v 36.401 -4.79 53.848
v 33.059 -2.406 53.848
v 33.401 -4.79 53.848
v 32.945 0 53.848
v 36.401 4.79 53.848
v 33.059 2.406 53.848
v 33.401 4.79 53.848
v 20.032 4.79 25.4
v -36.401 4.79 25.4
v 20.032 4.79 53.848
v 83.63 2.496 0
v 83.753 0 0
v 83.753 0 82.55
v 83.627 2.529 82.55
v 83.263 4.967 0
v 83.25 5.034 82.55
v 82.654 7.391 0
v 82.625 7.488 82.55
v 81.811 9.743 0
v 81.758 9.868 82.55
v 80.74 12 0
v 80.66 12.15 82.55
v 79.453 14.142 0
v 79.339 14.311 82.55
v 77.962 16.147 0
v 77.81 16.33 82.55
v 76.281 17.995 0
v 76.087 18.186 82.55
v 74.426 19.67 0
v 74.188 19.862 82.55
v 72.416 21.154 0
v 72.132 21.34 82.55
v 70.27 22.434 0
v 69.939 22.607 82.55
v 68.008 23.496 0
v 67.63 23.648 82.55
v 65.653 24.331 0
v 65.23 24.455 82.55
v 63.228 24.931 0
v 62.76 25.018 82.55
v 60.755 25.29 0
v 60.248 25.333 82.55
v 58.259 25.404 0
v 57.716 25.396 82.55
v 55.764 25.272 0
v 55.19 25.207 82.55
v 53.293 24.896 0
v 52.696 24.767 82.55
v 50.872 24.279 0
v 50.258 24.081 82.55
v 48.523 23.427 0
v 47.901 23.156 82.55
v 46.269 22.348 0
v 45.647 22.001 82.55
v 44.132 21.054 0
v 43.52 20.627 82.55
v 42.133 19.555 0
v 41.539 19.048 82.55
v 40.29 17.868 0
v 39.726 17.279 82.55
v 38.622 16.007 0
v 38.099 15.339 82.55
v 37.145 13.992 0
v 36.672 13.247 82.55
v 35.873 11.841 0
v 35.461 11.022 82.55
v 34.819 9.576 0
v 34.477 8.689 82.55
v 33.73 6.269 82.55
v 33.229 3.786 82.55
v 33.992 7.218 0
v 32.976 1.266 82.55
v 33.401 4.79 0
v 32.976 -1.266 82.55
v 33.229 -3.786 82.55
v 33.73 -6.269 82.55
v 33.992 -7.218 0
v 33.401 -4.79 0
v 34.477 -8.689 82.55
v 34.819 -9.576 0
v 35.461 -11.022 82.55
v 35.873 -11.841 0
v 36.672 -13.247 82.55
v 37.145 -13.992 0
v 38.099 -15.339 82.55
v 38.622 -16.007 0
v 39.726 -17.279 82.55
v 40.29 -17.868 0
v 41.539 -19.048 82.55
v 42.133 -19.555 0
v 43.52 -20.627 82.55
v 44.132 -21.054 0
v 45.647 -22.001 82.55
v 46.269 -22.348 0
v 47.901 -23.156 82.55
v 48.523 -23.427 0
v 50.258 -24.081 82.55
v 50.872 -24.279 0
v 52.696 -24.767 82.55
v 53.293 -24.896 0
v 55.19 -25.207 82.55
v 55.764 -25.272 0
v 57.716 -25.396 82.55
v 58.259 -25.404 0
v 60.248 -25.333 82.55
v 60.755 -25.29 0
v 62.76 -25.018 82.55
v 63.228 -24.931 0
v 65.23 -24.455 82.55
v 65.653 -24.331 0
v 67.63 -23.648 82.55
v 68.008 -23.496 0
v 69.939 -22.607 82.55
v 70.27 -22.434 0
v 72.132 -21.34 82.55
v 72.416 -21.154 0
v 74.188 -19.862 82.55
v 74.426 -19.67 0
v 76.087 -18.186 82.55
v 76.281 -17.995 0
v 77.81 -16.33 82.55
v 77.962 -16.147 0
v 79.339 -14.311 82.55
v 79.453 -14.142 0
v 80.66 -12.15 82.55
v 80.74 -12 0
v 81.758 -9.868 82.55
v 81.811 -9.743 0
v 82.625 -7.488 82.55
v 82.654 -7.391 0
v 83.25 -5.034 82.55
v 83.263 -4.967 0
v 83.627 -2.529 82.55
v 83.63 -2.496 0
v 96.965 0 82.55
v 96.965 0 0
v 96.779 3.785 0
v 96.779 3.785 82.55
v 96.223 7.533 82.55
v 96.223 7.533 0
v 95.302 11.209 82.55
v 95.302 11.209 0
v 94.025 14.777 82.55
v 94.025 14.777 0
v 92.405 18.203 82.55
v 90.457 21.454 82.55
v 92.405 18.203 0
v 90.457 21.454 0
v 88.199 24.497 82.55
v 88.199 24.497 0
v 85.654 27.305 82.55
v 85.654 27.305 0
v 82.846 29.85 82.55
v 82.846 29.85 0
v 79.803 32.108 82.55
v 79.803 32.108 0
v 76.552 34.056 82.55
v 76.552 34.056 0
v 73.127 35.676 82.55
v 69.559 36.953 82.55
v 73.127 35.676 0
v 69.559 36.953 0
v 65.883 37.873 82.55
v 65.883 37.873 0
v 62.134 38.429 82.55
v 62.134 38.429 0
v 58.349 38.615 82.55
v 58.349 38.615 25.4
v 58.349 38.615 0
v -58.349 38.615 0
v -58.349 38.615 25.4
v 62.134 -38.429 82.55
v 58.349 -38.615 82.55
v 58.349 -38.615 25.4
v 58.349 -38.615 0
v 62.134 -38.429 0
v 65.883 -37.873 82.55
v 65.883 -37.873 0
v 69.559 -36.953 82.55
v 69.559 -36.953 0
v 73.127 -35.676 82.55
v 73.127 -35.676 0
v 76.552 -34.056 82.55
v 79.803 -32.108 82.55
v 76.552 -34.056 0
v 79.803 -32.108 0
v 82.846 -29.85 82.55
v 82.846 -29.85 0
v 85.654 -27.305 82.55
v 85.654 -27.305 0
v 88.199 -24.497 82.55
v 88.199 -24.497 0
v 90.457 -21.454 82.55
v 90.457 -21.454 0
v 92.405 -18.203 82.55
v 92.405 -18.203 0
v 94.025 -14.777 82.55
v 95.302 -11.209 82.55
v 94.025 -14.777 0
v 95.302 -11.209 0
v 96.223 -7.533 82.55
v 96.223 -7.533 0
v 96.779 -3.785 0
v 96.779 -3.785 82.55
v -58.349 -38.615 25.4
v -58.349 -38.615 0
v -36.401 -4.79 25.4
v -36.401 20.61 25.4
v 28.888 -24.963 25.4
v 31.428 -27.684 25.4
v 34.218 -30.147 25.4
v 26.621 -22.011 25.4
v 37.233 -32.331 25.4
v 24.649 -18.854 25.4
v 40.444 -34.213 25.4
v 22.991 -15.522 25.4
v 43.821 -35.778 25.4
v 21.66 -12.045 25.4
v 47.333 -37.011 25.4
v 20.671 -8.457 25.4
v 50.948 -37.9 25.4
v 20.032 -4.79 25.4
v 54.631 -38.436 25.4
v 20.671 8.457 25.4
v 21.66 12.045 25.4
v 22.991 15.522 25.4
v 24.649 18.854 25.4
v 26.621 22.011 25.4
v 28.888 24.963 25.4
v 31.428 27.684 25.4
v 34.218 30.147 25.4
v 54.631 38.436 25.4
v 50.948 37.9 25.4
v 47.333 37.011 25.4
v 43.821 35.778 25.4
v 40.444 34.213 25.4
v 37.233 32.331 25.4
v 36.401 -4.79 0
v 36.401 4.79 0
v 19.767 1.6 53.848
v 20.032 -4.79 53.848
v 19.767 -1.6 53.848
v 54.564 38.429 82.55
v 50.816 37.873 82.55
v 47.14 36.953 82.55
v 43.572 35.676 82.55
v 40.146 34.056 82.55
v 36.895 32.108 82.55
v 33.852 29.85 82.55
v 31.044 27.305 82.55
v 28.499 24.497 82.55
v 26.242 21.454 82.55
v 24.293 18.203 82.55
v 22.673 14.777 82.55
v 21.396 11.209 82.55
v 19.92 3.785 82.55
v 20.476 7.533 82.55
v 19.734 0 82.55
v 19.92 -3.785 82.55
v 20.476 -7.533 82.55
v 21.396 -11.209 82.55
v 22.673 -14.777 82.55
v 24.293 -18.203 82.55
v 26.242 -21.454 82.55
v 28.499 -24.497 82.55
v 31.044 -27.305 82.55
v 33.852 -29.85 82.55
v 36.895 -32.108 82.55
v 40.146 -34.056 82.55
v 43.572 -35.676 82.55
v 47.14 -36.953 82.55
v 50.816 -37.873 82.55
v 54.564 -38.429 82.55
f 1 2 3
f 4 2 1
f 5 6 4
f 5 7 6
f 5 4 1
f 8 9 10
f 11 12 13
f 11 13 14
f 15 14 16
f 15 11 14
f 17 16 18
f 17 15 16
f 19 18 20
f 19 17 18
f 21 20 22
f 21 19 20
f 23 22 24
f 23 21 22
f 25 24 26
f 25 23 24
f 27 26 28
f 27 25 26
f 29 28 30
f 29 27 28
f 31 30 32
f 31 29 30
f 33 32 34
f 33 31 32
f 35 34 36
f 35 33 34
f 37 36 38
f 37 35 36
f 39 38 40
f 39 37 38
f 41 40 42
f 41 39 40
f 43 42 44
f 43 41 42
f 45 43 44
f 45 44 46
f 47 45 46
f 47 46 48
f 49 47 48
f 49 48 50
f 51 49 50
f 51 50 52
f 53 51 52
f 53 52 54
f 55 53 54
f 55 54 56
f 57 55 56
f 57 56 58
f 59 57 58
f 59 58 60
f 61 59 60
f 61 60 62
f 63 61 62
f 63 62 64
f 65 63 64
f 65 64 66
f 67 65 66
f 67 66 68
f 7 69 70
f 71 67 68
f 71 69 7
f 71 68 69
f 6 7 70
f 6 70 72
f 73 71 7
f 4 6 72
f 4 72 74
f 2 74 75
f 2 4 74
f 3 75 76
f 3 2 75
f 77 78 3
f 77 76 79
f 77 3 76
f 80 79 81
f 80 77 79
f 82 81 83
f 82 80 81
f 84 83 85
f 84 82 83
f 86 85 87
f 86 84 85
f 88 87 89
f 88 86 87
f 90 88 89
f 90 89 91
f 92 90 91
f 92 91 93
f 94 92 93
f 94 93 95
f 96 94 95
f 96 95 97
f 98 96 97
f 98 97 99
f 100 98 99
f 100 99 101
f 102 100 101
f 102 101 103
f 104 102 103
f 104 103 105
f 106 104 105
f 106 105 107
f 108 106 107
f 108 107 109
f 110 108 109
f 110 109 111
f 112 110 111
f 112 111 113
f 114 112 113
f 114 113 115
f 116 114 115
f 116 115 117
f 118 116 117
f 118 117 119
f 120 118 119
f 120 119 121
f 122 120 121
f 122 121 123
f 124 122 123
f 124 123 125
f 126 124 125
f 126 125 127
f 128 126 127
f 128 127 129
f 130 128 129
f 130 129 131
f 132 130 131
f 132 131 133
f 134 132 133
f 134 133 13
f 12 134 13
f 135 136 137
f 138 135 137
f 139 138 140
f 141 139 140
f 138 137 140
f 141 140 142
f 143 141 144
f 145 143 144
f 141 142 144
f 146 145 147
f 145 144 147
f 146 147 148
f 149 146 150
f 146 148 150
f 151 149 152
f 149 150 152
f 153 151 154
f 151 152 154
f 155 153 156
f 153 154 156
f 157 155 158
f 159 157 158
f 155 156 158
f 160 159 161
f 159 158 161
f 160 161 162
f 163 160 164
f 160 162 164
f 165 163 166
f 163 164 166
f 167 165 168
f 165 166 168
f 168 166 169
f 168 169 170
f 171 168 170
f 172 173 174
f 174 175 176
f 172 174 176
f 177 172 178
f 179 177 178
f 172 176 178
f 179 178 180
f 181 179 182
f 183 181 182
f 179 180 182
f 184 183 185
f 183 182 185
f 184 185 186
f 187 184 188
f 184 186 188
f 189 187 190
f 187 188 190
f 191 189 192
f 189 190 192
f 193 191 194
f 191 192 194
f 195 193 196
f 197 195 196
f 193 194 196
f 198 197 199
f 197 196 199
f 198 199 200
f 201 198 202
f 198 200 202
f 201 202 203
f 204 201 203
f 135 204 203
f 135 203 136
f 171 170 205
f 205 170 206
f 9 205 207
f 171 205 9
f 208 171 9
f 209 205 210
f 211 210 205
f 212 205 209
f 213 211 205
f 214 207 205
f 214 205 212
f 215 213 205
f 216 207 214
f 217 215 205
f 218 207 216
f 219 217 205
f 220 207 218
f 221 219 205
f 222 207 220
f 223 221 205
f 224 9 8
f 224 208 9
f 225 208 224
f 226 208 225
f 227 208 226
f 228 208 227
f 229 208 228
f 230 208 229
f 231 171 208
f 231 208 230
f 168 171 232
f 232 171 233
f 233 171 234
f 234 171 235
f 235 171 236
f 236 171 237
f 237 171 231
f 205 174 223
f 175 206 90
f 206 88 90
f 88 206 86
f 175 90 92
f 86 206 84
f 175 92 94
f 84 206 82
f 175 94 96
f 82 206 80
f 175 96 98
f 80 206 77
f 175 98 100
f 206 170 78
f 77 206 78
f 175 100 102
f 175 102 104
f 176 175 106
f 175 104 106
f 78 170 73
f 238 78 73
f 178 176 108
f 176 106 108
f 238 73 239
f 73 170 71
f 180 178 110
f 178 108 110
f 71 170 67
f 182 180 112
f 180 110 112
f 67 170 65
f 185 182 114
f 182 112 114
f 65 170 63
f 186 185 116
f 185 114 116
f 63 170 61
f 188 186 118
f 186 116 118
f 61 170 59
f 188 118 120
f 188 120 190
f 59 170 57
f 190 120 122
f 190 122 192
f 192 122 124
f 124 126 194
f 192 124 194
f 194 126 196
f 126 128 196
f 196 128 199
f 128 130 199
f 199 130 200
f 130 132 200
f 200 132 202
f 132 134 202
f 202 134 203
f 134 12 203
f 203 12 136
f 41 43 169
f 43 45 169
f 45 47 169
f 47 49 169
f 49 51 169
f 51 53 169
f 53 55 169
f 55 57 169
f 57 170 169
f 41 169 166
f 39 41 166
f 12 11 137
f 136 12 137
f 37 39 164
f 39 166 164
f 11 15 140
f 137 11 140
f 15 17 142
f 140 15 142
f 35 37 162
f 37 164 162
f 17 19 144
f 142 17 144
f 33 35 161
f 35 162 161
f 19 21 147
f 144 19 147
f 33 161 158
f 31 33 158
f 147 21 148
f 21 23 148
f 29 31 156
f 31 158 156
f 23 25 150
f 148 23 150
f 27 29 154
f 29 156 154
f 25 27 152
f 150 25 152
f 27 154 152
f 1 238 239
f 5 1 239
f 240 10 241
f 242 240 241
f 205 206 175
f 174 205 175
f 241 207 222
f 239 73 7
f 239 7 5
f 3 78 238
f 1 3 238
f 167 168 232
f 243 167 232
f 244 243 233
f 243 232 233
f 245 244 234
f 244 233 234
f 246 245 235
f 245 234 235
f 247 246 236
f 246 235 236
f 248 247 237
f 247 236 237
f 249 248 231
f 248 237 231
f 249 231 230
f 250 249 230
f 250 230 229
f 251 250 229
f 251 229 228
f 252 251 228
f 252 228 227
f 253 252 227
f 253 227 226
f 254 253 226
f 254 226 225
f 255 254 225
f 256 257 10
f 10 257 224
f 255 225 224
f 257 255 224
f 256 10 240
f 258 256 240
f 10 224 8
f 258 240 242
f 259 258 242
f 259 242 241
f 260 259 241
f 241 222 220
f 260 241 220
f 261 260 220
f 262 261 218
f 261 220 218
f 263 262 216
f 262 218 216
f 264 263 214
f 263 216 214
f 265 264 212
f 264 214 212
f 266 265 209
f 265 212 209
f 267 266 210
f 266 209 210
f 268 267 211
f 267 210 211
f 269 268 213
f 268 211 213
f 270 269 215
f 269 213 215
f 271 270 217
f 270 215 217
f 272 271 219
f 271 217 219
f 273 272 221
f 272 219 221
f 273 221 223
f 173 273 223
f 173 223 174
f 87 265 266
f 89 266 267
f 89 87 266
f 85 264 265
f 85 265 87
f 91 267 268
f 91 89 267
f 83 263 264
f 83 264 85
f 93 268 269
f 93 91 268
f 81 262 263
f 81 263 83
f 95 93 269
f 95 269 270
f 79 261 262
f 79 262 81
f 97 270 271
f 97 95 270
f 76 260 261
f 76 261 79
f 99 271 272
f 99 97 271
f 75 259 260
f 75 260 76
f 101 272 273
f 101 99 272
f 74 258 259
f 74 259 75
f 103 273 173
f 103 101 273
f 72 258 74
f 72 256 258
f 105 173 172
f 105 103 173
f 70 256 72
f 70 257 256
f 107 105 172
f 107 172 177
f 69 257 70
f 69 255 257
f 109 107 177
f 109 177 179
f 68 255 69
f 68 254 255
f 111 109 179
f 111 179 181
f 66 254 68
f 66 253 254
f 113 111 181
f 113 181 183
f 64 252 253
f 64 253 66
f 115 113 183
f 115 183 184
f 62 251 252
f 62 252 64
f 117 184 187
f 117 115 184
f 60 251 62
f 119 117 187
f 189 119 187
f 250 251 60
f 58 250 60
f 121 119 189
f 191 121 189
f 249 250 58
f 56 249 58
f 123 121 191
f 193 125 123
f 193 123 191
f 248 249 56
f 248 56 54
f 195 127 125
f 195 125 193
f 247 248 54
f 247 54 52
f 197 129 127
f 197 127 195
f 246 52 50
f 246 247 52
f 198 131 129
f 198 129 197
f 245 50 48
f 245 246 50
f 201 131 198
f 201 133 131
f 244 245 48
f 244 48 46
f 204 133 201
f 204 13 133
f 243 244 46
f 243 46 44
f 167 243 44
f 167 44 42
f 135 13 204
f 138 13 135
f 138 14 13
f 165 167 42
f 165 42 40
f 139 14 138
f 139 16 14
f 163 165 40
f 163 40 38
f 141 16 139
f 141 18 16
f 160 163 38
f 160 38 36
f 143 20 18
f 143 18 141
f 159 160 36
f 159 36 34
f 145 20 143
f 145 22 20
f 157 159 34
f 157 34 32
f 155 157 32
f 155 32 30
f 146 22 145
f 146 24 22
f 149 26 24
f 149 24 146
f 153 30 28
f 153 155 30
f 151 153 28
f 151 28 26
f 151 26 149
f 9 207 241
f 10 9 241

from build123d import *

# Parameters (mm, degrees)
F0_R     = 25.404221
F1_DEPTH = 82.55
F2_DEPTH = 25.4
F3_W     = 72.80118
F3_H     = 9.580332
F4_DEPTH = 53.848
F6_DEPTH = 25.4


with BuildPart() as f1:
    # F0 (on Top) → F1 (new body)
    with BuildSketch(Plane.XY):
        with BuildLine():
            ThreePointArc((96.964516, 0), (85.654314, 27.305241), (58.349073, 38.615443))
            ThreePointArc((58.349073, 38.615443), (19.73363, 0), (58.349073, -38.615443))
            ThreePointArc((58.349073, -38.615443), (85.654314, -27.305241), (96.964516, 0))
        make_face()
        with Locations((58.349073, 0)):
            Circle(F0_R, mode=Mode.SUBTRACT)
    extrude(amount=F1_DEPTH)

    # F0 (on Top) → F2 (join)
    with BuildSketch(Plane.XY):
        with BuildLine():
            Line((58.349073, 38.615443), (-58.349073, 38.615443))
            Line((-58.349073, 38.615443), (-58.349073, -38.615443))
            Line((-58.349073, -38.615443), (58.349073, -38.615443))
            ThreePointArc((58.349073, -38.615443), (19.73363, 0), (58.349073, 38.615443))
        make_face()
    extrude(amount=F2_DEPTH)

    # F3 (on Top) → F4 (join)
    with BuildSketch(Plane.XY):
        Rectangle(F3_W, F3_H)
    extrude(amount=F4_DEPTH)

    # F5 (on face) → F6 (cut)
    with BuildSketch(Plane.XZ.offset(4.790166)):
        Polygon((-36.40059, 25.4), (20.031887, 53.848), (-36.40059, 53.848), align=None)
    extrude(amount=-F6_DEPTH, mode=Mode.SUBTRACT)


solid = f1.part
